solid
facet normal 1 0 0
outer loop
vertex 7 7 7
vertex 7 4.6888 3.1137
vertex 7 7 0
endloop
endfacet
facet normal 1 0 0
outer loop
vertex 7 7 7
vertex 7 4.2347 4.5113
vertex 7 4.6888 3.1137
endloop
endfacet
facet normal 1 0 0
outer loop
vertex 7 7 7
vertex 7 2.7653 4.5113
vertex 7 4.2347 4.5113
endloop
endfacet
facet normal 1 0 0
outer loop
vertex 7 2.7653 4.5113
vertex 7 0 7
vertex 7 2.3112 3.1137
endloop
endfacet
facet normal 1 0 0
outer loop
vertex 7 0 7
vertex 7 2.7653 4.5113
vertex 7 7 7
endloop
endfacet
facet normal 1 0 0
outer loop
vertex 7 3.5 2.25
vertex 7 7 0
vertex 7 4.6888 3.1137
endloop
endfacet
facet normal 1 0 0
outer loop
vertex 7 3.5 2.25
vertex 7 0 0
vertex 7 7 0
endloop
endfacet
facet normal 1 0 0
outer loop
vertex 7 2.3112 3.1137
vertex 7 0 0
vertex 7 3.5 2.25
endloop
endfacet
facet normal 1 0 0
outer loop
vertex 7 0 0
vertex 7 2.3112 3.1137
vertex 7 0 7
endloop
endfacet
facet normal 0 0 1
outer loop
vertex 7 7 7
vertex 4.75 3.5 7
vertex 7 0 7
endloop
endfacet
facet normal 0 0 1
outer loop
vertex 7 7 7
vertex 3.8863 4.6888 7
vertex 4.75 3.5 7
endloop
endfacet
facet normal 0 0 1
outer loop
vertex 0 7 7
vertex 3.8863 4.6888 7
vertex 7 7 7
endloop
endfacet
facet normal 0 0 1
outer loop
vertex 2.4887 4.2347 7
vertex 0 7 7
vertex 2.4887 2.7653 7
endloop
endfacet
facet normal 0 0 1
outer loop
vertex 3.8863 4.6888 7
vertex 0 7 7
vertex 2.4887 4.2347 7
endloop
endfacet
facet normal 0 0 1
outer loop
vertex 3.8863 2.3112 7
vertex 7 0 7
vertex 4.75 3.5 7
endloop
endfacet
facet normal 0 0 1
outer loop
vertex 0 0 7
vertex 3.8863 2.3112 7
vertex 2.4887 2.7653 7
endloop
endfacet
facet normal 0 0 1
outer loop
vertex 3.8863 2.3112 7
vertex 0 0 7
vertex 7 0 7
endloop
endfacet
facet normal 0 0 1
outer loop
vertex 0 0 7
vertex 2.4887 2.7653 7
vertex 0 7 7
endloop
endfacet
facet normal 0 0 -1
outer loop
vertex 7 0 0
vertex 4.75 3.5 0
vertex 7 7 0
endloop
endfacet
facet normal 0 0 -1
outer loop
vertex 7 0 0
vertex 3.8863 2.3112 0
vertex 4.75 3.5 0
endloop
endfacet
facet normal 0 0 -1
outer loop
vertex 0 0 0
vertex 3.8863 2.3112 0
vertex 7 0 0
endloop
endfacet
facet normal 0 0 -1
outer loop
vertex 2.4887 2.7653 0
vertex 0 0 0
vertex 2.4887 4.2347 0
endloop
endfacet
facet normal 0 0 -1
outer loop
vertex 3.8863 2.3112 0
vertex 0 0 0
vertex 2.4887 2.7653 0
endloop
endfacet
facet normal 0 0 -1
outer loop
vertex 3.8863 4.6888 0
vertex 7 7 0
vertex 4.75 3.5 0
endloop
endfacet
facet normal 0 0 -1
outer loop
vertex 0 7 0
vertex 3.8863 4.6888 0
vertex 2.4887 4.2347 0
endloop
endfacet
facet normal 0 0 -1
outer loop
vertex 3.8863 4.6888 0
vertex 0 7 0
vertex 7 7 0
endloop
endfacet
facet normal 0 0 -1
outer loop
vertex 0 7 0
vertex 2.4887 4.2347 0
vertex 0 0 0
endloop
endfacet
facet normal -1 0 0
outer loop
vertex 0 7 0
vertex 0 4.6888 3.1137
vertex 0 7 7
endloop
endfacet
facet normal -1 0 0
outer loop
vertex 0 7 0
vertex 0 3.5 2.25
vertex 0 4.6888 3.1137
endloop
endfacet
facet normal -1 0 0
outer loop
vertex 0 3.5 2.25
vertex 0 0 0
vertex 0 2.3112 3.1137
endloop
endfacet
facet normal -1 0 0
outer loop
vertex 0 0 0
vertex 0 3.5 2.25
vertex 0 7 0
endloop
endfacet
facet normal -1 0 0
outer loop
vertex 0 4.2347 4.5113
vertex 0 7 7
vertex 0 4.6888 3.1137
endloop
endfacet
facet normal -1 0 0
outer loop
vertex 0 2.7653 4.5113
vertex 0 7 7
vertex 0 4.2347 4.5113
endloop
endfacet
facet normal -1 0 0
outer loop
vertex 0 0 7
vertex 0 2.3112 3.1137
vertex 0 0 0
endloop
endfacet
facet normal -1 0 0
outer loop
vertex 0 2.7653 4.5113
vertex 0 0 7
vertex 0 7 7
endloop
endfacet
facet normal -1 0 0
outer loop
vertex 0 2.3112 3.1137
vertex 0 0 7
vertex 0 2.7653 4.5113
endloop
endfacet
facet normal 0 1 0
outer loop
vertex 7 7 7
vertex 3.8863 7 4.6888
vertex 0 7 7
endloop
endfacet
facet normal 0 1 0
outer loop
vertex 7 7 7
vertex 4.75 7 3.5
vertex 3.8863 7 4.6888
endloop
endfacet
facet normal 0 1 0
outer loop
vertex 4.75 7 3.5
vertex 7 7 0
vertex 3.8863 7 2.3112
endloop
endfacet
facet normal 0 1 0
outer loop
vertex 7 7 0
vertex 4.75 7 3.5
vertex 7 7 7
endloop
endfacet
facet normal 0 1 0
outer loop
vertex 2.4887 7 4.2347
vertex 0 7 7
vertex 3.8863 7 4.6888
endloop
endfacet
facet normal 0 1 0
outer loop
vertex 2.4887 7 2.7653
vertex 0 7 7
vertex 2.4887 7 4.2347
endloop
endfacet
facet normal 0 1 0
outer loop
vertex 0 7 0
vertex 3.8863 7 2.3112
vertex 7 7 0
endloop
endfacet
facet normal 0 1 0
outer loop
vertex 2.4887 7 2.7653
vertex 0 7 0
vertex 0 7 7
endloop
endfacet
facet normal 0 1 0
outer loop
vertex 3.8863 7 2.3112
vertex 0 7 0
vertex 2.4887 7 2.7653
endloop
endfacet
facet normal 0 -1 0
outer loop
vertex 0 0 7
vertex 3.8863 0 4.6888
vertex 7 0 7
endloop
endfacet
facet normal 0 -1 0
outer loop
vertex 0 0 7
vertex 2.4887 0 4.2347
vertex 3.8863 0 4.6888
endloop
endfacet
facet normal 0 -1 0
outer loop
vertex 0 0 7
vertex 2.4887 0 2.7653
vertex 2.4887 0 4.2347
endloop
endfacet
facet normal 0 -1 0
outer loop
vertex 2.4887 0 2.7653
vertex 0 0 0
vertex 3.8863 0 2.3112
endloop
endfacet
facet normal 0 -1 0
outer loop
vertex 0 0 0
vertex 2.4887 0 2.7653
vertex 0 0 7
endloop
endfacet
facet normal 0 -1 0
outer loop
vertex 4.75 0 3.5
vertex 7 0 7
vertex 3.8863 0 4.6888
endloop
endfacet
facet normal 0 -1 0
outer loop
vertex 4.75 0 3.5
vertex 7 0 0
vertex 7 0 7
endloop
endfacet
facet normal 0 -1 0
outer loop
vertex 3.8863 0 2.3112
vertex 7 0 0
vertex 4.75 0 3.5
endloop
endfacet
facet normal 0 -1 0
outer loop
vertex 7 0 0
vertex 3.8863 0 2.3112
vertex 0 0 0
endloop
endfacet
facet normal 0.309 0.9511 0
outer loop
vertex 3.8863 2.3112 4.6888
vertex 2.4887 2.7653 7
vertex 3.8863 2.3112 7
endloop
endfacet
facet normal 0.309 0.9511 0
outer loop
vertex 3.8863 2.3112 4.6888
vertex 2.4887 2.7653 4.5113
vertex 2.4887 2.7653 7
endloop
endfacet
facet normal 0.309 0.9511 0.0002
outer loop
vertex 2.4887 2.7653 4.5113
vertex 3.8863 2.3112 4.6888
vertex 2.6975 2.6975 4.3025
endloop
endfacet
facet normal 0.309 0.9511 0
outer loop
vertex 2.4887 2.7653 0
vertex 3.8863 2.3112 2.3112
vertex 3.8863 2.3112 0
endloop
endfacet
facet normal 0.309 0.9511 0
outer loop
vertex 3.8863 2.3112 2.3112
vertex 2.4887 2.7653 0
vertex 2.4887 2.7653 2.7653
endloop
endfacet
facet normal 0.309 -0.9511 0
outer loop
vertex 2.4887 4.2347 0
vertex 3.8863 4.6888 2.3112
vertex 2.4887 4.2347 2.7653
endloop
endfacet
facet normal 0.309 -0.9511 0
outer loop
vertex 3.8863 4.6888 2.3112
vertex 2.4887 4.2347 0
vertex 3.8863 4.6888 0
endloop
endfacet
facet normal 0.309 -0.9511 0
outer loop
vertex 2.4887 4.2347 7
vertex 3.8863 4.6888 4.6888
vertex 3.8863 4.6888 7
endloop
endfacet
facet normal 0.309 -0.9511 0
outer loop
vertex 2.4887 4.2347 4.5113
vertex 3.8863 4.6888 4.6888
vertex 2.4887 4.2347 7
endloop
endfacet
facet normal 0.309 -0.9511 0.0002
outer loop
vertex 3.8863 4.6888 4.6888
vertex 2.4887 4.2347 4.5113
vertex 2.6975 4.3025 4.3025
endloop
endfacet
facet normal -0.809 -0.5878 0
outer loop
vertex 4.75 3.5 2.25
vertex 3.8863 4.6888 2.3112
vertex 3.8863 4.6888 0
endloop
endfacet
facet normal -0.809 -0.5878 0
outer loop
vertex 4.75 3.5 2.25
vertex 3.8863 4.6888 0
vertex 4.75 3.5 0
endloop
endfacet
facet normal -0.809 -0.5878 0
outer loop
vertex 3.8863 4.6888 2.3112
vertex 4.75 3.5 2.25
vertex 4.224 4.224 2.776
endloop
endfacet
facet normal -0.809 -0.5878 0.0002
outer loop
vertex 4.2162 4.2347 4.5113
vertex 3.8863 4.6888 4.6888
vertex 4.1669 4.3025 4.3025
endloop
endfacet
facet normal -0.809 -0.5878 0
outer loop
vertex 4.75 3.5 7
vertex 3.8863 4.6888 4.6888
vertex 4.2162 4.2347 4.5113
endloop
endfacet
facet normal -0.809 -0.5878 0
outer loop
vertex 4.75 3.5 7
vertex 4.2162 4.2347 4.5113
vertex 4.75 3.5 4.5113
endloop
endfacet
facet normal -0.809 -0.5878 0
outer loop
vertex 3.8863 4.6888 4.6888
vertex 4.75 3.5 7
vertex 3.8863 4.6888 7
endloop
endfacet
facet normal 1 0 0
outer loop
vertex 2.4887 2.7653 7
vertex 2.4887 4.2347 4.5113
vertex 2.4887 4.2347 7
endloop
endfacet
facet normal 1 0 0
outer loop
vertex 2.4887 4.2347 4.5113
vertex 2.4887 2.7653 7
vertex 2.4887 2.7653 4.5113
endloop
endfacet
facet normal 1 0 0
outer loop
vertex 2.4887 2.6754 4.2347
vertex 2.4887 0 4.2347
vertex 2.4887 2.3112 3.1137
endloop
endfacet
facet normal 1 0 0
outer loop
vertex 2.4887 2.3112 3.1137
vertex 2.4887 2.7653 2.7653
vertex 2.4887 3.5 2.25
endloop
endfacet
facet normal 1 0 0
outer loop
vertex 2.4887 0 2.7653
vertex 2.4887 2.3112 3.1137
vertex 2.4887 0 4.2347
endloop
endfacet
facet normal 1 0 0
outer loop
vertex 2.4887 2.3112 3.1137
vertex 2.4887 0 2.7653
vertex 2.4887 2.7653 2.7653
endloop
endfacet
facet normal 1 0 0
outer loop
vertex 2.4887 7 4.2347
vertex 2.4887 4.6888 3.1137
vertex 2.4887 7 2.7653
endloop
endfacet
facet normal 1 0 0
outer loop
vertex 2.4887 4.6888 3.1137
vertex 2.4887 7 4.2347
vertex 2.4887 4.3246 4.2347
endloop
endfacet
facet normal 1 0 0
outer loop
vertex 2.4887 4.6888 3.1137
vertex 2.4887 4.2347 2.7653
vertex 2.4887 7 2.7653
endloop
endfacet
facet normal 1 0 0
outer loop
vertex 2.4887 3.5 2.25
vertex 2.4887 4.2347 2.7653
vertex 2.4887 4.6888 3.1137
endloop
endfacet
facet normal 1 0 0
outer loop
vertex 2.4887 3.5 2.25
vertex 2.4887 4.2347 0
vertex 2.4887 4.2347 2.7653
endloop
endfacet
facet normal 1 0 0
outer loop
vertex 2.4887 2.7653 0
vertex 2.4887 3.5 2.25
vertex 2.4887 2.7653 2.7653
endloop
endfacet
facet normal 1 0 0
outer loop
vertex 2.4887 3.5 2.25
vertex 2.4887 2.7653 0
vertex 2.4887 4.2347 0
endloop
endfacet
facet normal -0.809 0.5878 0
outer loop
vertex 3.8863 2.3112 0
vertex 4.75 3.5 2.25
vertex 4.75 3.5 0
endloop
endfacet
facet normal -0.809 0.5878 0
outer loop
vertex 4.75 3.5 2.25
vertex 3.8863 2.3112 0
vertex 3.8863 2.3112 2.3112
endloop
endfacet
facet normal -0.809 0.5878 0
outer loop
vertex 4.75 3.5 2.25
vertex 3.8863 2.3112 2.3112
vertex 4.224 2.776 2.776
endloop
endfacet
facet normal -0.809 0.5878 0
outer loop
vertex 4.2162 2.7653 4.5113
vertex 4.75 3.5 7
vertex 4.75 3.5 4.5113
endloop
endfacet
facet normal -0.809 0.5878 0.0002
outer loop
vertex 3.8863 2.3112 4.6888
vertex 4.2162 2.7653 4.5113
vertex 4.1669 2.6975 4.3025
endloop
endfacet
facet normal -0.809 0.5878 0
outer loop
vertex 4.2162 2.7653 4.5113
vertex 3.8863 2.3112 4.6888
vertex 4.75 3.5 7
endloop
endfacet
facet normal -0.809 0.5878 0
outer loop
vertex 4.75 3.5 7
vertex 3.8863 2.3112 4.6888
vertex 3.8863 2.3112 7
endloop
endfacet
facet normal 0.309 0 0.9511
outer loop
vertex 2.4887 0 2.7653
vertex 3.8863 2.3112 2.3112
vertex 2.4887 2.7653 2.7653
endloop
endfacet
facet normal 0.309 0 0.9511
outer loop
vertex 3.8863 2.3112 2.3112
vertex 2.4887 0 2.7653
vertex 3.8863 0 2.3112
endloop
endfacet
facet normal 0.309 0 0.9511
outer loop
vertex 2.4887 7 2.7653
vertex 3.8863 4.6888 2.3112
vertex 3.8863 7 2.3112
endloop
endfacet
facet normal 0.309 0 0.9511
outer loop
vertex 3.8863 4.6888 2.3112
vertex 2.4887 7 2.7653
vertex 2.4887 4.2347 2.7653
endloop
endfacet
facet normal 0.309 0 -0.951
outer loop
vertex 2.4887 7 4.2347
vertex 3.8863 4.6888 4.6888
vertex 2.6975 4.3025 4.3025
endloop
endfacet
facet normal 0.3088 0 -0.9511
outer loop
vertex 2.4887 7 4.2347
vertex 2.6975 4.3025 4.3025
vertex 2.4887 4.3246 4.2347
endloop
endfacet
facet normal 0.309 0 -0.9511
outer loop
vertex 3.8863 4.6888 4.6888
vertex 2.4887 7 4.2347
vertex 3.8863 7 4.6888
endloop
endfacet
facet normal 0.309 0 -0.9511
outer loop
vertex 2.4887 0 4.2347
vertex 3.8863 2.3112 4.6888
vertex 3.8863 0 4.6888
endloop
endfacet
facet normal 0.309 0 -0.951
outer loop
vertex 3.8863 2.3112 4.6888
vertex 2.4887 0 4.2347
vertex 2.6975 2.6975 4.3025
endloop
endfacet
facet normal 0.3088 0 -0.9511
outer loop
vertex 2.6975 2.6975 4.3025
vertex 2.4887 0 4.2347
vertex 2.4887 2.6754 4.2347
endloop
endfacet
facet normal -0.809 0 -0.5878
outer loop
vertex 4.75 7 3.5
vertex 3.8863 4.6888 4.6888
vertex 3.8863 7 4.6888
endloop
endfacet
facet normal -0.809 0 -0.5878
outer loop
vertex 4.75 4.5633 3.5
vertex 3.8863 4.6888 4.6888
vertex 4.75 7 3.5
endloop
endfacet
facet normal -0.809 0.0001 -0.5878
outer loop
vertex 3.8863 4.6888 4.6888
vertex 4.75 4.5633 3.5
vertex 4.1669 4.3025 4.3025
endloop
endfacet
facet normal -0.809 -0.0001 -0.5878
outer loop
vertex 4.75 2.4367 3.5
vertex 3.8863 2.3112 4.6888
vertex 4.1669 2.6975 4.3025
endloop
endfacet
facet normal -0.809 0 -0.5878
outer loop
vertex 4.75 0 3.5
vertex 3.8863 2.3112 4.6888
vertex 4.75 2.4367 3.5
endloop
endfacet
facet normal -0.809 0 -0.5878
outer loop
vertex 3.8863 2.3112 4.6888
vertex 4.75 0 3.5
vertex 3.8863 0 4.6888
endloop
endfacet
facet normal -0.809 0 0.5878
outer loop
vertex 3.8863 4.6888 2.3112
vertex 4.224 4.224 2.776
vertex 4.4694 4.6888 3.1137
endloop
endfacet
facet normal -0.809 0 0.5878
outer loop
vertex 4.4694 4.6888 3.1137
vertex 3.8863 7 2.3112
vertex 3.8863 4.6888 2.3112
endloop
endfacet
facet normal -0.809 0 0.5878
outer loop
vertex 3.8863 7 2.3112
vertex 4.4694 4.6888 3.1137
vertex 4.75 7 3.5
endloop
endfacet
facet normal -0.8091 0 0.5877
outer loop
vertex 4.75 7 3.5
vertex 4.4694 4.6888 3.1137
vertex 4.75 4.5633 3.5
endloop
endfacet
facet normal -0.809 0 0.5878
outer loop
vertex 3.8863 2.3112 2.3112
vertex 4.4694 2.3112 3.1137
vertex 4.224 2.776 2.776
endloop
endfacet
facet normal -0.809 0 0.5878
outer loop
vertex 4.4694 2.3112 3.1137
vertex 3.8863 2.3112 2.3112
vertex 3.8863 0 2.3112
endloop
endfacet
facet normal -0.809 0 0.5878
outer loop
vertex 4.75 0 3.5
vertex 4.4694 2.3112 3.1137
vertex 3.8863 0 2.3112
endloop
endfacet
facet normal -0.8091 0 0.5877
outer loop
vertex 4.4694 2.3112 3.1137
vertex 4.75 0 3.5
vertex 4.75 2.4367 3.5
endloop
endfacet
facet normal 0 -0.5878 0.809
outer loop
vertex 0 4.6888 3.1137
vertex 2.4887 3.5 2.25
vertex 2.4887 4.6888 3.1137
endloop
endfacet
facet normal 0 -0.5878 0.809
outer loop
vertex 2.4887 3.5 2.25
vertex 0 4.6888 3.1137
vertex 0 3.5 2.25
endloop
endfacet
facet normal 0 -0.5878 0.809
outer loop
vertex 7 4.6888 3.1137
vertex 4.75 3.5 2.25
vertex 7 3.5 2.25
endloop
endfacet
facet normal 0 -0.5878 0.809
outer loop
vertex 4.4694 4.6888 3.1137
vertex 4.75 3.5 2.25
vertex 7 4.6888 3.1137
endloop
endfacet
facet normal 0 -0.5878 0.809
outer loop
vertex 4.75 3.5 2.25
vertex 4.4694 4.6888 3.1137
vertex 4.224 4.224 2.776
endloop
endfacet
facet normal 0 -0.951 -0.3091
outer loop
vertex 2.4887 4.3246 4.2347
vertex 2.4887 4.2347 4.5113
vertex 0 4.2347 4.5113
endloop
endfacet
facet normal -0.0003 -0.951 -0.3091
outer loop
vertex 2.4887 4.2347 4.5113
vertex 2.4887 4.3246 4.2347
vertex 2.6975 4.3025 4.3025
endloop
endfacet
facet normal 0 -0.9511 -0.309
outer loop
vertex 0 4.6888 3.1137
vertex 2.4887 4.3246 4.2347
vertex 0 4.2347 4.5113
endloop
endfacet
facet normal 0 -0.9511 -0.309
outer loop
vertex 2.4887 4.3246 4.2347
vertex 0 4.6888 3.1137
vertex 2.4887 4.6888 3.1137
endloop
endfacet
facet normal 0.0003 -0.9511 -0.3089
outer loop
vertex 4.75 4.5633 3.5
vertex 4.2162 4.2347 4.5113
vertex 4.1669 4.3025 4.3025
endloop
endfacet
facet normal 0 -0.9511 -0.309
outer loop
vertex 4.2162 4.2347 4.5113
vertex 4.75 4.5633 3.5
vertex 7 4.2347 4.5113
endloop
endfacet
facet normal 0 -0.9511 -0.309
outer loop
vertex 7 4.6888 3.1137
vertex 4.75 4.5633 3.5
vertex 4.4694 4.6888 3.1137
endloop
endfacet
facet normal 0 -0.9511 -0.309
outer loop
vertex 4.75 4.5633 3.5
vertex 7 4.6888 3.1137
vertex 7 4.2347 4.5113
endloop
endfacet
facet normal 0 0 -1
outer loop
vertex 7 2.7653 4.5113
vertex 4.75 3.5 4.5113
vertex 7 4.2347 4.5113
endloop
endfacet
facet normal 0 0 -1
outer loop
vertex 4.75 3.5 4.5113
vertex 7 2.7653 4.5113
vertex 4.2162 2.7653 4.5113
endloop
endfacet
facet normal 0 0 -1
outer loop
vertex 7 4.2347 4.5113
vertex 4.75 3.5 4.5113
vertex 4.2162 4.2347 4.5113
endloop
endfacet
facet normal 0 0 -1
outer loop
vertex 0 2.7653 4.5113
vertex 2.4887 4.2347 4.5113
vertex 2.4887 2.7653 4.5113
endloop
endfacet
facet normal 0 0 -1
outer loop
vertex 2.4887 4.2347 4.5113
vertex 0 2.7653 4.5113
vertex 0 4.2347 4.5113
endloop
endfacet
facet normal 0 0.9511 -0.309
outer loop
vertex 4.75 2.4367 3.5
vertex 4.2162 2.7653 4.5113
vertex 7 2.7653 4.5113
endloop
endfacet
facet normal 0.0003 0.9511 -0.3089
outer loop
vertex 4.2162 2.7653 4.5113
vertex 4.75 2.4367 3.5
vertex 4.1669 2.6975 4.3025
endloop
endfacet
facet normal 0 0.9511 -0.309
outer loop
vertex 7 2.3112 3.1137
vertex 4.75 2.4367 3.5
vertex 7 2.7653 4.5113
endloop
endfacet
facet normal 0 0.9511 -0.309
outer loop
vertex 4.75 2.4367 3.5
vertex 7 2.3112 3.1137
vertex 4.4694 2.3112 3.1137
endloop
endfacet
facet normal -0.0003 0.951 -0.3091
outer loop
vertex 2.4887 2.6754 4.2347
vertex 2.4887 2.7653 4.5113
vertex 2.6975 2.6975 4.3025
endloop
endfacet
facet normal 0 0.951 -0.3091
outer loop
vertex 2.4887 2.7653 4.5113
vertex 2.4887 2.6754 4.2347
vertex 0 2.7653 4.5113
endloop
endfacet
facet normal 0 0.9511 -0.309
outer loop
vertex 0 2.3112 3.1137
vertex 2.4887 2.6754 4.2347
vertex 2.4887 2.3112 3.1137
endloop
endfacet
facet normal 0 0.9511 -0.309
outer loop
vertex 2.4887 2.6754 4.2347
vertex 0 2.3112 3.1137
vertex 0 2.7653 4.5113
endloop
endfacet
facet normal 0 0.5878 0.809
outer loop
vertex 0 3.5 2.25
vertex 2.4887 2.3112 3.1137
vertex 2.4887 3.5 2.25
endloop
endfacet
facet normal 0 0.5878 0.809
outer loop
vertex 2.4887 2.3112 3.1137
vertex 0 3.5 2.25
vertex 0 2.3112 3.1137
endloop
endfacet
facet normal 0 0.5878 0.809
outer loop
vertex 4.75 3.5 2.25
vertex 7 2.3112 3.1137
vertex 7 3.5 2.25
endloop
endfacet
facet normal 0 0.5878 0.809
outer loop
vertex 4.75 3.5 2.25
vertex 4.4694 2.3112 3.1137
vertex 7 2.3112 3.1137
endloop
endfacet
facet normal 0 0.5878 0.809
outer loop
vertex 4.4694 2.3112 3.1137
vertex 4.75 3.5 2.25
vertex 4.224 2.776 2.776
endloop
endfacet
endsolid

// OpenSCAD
// cube with six holes for internal tapping.
// to be used like a right angle bracket but omnidirectional.

module clamp_cube(s, d) {
	assert(s > d);
	half = s * 0.5;

	translate([half,half,half]) difference() {
		cube([s, s, s], true);
		cylinder(h = s, d = d, center = true);
		rotate([90,0,0]) cylinder(h = s, d = d, center = true);
		rotate([0,90,0]) cylinder(h = s, d = d, center = true);
	}
}

//$fn = 64;
// example instance which would be lego technic (8mm grid) compatible,
// if used with 0.5mm thickness washers on each face (M2.5 and M3 washers).
clamp_cube(7, 2.5);
